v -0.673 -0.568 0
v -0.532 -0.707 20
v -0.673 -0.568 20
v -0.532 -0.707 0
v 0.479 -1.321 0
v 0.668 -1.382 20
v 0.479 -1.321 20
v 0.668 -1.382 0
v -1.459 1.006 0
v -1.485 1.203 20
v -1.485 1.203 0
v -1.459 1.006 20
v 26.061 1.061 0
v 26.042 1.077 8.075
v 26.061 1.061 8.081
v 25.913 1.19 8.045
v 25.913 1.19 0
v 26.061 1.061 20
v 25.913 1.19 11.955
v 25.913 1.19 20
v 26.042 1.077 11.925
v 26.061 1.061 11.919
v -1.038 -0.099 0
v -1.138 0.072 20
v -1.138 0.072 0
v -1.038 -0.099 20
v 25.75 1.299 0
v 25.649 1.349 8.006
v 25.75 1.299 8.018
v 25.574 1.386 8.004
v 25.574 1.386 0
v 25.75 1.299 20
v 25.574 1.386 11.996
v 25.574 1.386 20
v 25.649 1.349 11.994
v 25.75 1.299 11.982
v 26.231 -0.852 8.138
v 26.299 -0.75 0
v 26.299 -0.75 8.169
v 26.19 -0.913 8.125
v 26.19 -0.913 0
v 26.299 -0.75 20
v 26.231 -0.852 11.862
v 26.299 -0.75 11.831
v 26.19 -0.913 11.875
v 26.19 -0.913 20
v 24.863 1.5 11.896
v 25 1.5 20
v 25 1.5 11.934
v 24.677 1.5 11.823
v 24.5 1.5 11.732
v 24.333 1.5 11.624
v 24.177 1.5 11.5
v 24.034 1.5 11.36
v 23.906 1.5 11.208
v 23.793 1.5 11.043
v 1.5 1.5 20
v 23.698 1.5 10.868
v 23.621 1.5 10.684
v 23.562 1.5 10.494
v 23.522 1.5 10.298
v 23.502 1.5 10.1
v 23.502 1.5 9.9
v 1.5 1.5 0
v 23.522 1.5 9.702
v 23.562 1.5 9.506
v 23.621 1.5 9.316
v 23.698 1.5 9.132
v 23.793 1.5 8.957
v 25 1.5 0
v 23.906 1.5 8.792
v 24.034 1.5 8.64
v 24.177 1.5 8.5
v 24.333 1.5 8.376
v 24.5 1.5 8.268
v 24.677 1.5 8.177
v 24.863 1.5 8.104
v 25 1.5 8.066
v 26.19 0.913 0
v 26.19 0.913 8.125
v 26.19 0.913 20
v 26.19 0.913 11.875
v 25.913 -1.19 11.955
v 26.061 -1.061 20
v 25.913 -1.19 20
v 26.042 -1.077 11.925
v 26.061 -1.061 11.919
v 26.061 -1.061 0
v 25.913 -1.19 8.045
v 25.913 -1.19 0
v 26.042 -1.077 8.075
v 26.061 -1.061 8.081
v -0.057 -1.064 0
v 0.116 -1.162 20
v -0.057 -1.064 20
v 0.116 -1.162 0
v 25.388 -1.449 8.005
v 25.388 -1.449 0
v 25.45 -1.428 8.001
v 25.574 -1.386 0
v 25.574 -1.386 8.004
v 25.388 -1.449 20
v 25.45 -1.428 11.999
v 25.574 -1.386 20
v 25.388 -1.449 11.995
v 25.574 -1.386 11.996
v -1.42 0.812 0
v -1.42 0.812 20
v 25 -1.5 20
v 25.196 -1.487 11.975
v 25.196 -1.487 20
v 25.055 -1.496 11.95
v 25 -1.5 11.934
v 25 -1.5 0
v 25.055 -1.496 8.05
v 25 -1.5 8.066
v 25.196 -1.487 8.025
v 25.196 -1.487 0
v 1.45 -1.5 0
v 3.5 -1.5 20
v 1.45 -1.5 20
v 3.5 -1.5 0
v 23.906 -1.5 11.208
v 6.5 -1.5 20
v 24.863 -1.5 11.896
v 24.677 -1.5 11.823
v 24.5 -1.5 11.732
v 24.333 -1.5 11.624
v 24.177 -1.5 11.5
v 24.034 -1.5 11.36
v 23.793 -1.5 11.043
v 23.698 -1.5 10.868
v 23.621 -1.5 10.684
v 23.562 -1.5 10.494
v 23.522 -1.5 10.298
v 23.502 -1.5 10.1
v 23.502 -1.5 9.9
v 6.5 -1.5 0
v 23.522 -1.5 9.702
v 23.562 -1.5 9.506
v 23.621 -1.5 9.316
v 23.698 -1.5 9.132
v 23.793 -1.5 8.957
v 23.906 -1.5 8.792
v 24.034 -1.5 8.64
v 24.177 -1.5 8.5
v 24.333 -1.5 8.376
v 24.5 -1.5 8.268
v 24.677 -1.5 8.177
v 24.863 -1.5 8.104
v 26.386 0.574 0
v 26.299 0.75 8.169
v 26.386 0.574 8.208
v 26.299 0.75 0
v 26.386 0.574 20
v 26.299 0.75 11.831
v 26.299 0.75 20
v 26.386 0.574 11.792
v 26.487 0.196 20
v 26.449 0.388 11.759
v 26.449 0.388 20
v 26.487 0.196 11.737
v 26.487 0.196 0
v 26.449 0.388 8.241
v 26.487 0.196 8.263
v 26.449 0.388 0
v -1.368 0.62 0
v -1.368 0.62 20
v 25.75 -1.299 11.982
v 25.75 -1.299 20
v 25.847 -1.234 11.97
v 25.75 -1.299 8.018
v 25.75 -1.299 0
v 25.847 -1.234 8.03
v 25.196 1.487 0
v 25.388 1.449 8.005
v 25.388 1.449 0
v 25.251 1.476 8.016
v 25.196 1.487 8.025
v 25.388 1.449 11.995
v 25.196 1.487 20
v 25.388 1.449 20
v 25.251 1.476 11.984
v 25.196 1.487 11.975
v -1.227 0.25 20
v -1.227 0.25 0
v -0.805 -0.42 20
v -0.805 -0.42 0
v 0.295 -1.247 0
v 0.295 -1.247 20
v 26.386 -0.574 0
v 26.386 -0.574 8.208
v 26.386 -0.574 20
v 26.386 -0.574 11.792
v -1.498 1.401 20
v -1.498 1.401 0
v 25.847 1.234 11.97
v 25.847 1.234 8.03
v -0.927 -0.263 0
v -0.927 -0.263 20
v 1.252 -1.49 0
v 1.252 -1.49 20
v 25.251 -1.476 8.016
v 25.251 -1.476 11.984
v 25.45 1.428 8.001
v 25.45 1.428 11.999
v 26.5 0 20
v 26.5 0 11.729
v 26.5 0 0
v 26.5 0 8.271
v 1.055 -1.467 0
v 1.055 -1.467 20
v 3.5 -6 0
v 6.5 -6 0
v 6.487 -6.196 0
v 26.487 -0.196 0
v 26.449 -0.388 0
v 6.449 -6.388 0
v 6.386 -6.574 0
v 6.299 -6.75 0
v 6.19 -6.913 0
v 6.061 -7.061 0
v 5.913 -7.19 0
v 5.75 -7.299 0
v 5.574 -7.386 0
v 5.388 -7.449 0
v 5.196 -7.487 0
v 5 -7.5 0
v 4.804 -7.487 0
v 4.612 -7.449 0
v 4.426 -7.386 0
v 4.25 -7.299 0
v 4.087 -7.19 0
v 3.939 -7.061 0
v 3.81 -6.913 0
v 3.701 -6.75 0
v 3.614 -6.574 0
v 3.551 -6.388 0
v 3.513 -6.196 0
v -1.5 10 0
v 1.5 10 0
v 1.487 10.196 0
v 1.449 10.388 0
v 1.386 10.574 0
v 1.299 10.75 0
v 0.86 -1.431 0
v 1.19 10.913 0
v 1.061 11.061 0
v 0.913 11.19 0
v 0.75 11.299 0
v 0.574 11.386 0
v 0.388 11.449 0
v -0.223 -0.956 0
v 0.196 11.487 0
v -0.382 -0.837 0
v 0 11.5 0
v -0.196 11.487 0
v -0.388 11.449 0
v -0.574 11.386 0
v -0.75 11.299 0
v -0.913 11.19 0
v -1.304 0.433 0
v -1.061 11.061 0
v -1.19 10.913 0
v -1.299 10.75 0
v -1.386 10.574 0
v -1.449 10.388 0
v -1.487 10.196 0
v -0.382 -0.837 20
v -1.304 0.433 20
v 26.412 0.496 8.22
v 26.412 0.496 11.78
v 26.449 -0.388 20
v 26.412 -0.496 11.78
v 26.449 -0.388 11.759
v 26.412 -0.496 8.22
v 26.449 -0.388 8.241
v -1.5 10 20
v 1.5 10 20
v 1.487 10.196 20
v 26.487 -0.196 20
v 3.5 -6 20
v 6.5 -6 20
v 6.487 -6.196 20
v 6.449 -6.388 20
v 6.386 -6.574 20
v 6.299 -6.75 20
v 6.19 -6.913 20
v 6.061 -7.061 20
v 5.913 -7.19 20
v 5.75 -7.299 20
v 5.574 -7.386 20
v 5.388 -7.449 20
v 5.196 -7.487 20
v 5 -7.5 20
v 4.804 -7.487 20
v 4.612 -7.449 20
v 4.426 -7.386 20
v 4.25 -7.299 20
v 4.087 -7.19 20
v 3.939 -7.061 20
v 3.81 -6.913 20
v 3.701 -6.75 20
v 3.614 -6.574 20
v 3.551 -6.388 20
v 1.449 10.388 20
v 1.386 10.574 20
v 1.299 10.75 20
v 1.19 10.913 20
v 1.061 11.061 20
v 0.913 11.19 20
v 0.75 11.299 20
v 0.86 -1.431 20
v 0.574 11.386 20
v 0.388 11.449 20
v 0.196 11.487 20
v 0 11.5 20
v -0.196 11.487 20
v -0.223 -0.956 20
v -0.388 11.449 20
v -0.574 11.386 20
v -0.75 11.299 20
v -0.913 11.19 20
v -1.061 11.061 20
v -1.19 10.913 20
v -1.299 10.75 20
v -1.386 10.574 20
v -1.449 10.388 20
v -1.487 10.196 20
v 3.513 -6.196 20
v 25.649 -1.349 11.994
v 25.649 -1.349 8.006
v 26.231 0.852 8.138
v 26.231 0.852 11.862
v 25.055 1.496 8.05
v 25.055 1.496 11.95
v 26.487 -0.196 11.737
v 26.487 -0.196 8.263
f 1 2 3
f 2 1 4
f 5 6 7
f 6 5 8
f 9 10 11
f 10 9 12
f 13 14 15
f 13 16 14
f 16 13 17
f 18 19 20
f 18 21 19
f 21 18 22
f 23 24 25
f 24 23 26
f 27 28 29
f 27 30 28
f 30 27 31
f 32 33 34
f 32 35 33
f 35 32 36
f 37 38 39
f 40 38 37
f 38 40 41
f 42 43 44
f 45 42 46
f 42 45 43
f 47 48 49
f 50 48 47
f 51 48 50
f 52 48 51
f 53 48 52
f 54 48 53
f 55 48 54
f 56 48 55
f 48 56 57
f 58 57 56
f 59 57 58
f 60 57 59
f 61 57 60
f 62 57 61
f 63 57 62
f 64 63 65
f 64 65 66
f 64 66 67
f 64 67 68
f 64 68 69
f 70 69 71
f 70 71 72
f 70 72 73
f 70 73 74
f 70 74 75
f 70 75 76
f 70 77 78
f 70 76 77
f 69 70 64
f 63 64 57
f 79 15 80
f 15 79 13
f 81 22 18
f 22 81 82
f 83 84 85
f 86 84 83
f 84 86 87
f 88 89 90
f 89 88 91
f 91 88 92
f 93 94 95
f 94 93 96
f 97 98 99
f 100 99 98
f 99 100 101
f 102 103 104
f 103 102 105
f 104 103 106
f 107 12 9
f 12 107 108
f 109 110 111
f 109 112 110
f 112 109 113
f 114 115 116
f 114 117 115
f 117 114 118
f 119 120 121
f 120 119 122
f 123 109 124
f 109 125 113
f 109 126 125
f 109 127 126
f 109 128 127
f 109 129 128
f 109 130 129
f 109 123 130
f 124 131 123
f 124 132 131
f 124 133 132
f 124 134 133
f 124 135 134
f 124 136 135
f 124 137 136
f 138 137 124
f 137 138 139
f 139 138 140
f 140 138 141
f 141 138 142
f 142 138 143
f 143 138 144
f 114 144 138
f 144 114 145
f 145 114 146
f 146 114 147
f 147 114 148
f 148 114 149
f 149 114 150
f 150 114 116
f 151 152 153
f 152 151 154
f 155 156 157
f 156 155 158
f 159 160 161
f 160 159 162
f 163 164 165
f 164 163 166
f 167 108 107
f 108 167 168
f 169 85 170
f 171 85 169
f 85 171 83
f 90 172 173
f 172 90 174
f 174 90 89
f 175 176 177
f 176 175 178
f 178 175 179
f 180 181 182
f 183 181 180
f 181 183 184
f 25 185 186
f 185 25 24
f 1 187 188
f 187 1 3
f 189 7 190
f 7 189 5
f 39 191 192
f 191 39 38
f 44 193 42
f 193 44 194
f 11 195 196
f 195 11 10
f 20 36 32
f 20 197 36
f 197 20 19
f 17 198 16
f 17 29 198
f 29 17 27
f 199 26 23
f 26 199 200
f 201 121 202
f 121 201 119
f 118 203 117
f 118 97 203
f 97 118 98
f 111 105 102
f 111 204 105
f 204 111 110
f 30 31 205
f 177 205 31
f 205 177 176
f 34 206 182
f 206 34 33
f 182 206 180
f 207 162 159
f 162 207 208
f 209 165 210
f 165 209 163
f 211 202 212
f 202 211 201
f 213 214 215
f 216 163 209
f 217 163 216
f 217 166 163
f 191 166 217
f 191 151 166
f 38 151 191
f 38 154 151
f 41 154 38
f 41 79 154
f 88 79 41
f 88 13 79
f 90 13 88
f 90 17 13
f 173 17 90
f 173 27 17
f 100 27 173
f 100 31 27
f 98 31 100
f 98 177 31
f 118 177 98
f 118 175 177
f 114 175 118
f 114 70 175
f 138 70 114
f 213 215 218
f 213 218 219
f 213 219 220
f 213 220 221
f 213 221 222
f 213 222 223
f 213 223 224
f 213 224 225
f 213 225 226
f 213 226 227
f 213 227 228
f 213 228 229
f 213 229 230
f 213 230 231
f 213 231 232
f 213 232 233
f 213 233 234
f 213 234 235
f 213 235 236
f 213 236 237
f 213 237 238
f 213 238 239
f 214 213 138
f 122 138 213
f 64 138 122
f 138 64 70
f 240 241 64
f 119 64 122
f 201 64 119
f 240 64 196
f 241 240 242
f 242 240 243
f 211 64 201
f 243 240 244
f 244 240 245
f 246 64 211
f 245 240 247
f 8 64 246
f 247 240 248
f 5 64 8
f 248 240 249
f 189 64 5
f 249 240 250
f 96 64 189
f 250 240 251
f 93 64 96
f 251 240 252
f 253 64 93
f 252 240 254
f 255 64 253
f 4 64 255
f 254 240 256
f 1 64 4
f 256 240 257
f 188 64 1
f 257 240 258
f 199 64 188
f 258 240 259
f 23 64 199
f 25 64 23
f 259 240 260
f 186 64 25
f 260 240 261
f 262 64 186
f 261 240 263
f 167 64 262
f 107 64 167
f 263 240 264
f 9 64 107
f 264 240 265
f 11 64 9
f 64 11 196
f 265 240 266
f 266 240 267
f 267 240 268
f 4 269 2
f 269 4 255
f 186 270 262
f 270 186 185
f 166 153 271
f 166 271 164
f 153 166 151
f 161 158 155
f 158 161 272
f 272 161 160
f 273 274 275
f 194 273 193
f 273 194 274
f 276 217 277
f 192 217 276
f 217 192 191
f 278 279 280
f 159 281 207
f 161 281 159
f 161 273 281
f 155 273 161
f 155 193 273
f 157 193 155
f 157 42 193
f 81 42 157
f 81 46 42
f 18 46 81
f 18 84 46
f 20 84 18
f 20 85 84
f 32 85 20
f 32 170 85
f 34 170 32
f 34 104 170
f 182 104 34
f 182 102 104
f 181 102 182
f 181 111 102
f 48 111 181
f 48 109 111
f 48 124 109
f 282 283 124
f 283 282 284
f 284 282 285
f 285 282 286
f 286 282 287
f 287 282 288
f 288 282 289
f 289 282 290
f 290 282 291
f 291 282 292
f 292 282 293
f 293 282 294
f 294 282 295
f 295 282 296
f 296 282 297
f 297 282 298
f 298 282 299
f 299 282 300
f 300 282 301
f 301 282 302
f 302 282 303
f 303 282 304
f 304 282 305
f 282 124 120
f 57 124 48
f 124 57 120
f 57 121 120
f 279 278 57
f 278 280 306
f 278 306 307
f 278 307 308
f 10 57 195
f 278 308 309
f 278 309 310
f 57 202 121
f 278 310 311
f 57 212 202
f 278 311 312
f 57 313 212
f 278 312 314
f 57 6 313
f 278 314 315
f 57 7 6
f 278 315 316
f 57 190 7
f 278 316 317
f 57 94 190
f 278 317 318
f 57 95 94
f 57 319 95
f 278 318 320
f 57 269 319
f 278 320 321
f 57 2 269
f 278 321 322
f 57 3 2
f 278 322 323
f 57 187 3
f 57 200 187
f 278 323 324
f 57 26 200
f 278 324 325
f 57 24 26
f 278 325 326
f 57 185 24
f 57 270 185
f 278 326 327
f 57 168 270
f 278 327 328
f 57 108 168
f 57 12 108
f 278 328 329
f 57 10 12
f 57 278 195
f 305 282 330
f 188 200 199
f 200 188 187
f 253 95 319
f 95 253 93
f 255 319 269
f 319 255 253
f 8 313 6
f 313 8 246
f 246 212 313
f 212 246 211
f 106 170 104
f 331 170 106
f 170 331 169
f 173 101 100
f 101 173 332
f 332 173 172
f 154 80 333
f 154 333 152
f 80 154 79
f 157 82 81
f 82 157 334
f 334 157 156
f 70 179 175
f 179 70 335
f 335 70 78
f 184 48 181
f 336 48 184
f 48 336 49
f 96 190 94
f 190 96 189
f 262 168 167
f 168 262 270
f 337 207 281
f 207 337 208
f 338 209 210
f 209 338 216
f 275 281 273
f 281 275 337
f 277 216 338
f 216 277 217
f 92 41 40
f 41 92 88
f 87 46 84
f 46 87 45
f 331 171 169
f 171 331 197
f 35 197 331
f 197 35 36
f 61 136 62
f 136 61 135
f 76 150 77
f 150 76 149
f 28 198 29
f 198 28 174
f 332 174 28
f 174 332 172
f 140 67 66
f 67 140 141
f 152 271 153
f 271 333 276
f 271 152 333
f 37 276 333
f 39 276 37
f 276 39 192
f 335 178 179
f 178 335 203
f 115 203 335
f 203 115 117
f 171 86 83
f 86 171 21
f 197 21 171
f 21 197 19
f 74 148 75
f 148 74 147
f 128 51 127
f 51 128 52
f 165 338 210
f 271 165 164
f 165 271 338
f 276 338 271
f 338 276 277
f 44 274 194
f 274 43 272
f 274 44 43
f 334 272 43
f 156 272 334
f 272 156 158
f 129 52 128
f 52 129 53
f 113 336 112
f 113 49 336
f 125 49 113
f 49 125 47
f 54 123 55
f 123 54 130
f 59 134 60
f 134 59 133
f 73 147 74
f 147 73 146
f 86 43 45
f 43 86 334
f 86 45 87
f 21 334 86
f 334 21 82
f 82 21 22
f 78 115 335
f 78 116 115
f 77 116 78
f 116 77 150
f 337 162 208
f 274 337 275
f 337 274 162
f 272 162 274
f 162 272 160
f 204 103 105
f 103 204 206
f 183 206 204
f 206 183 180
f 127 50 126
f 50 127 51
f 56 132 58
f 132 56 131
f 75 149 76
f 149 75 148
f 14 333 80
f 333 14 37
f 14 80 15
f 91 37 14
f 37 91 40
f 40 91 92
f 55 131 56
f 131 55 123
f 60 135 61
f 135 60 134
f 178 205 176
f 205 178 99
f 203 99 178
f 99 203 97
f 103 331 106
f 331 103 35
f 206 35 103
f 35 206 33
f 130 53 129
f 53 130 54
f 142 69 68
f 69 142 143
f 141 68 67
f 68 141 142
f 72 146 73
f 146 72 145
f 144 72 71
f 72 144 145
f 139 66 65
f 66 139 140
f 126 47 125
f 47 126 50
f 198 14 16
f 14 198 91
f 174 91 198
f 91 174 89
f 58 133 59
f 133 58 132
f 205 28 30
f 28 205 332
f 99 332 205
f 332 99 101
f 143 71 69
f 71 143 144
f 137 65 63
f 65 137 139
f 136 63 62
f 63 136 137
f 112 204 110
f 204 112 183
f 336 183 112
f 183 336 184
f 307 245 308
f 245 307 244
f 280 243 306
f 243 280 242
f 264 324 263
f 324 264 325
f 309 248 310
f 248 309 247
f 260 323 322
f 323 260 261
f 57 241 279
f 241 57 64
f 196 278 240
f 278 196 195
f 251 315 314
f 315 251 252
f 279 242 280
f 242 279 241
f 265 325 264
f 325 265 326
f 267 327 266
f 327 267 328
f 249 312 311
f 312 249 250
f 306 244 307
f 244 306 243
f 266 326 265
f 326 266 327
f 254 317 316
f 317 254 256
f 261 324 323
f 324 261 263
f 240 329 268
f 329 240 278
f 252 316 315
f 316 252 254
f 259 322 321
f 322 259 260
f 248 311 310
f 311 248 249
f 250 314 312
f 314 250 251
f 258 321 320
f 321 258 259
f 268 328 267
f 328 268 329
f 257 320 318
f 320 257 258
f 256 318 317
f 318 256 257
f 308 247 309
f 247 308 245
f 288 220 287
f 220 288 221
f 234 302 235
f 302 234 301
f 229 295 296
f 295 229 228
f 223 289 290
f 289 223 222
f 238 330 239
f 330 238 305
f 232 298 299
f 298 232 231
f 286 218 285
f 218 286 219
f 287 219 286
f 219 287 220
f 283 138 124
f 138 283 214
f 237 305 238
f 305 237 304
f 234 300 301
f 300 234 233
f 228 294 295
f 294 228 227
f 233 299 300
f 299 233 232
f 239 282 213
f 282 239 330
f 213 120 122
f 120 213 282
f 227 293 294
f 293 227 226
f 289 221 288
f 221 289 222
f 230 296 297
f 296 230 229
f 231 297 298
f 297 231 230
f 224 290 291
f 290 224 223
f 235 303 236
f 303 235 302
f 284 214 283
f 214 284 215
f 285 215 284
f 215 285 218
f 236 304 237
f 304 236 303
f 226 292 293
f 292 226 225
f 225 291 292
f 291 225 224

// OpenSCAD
//Settings.
width = 20;
length = 22;
thickness = 3;
back_hook_length = 10;
down_hook_length = 6;
steel_thickness = 2;
cable_radius = 3.2 / 2 + 0.4; //Some extra play.
$fs = 0.2;
$fa = 1;

module corner() {
	cylinder(r = thickness / 2, h=width);
}
module spaced_corner() {
	intersection() {
		translate([thickness / 2, thickness / 2, 0]) {
			cylinder(r = thickness, h=width);
		}
		translate([-thickness / 2, -thickness / 2, 0]) {
			cube([thickness, thickness, width]);
		}
	}
}

hull() {
	spaced_corner();
	translate([0, back_hook_length, 0]) {
		corner();
	}
}
difference() {
	hull() {
		spaced_corner();
		translate([length + thickness, 0, 0]) {
			corner();
		}
	}
	translate([length + thickness / 2 + steel_thickness, -thickness / 2 - 1, width / 2]) {
		rotate([-90, 0, 0]) {
			cylinder(r=cable_radius, h=thickness + 2);
		}
	}
}
translate([thickness + steel_thickness, 0, 0]) {
	hull() {
		corner();
		translate([0, -down_hook_length, 0]) {
			corner();
		}
	}
}
